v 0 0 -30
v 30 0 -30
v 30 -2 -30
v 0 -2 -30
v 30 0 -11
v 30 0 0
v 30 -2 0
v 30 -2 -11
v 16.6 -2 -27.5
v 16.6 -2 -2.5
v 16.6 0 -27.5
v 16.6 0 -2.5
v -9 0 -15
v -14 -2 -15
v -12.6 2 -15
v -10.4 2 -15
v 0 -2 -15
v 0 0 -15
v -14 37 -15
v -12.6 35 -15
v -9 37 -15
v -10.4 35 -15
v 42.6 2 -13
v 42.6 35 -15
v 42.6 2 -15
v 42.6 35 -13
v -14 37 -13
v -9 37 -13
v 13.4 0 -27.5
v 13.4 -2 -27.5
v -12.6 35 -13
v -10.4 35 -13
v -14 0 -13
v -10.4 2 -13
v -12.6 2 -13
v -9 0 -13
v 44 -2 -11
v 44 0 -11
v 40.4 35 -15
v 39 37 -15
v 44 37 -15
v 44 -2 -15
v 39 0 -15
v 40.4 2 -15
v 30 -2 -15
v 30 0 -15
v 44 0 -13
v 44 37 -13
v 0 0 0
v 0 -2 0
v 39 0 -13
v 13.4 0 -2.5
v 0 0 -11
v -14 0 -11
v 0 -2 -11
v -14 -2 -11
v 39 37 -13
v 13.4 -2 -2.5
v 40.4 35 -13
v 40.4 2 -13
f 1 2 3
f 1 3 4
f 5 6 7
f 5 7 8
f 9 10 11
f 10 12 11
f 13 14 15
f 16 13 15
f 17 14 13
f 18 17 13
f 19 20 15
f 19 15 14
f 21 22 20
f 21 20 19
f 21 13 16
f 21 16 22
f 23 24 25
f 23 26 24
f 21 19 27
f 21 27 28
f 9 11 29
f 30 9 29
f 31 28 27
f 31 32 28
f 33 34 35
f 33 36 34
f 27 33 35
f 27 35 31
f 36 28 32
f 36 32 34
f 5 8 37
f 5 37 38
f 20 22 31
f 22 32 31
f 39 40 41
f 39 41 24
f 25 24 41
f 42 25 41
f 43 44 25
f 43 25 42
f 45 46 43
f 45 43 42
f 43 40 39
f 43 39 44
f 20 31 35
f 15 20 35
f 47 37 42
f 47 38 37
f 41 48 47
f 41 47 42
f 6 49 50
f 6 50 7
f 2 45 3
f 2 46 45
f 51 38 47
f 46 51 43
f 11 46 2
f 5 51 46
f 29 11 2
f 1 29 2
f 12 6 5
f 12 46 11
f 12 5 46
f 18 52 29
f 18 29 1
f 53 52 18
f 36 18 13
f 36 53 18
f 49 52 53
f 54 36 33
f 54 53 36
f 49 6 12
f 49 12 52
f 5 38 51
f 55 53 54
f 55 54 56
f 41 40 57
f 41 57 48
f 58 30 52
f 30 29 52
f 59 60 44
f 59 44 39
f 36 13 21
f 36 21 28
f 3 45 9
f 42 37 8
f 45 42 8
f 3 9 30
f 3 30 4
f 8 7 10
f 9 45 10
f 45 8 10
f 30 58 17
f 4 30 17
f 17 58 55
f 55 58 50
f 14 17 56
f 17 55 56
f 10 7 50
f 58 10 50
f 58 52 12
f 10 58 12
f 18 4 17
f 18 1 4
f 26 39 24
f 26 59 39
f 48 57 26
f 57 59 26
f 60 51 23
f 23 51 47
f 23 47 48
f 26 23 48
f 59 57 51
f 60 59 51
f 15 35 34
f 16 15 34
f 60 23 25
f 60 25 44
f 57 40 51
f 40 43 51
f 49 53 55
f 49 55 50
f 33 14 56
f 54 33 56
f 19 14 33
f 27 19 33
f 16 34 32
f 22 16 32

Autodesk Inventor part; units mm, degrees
ref_plane "YZ Plane" through (0, 0, 0) normal (1, 0, 0) x (0, 1, 0)
ref_plane "XZ Plane" through (0, 0, 0) normal (0, 1, 0) x (-1, 0, 0)
ref_plane "XY Plane" through (0, 0, 0) normal (0, 0, 1) x (1, 0, 0)
sketch "Sketch2" plane through (0, 0, 0) normal (0, 1, 0) x (-1, 0, 0)
  line L0 (0, 0) -> (-30, 0)
  line L1 (-30, 0) -> (-30, -30)
  line L2 (-30, -30) -> (0, -30)
  line L3 (0, -30) -> (0, 0)
  line L4 (0, 0) -> (-30, 0)
  line L5 (-30, 0) -> (-30, -2)
  line L6 (0, -2) -> (0, 0)
  line L7 (0, -30) -> (-30, -30)
  line L8 (-30, -30) -> (-30, -44)
  line L9 (0, -44) -> (0, -30)
  point P0 (0, 0)
  dimension "d0" = 30
  dimension "d1" = 30
extrude "Extrusion2" add sketch "Sketch2" against normal blind 2
sketch "Sketch5" plane through (0, 0, 0) normal (0, 1, 0) x (1, 0, 0)
  line L0 (13.4, 2.5) -> (16.6, 2.5)
  line L1 (16.6, 2.5) -> (16.6, 27.5)
  line L2 (16.6, 27.5) -> (13.4, 27.5)
  line L3 (13.4, 27.5) -> (13.4, 2.5)
  line L4 (30, 30) -> (0, 30) projected
  line L5 (0, 30) -> (0, 0) projected
  line L6 (30, 0) -> (30, 30) projected
  point P0 (15, 2.5)
  point P1 (15, 27.5)
  dimension "d21" = 25
  dimension "d25" = 3.2
  dimension "d26" = 2.5
  dimension "d56" = 15
extrude "Extrusion5" cut sketch "Sketch5" against normal through all
sketch "Sketch6" plane through (0, 0, -30) normal (-1, 0, 0) x (0, 0, 1)
  line L0 (30, 0) -> (0, 0) projected
  line L1 (0, -2) -> (30, -2) projected
  line L2 (15, 0) -> (19, 0)
  line L3 (19, 0) -> (19, -2)
  line L4 (19, -2) -> (15, -2)
  line L5 (15, -2) -> (15, 0)
  line L6 (0, 0) -> (0, -2) projected
  point P0 (0, -1)
  point P1 (15, -1)
  point P2 (15, 0)
  dimension "d28" = 15
  dimension "d29" = 4
  dimension "d30" = 2
extrude "Extrusion6" add sketch "Sketch6" along normal blind 14 contours L3 L1 L5 L0
sketch "Sketch7" plane through (30, 0, 0) normal (1, 0, 0) x (0, 0, -1)
  line L0 (0, 0) -> (30, 0) projected
  line L1 (30, -2) -> (0, -2) projected
  line L2 (11, 0) -> (15, 0)
  line L3 (15, 0) -> (15, -2)
  line L4 (15, -2) -> (11, -2)
  line L5 (11, -2) -> (11, 0)
  line L6 (30, 0) -> (30, -2) projected
  point P0 (30, -1)
  point P1 (15, -1)
  point P2 (15, -2)
  dimension "d33" = 15
  dimension "d34" = 4
extrude "Extrusion7" add sketch "Sketch7" along normal blind 14 contours L0 L3 L1 L5
sketch "Sketch8" plane through (0, 0, 0) normal (0, 1, 0) x (1, 0, 0)
  line L0 (-14, 15) -> (-14, 11) projected
  line L1 (-14, 15) -> (-9, 15)
  line L2 (-9, 15) -> (-9, 13)
  line L3 (-9, 13) -> (-14, 13)
  line L4 (-14, 13) -> (-14, 15)
  line L5 (30, 15) -> (44, 15) projected
  line L6 (44, 15) -> (39, 15)
  line L7 (39, 15) -> (39, 13)
  line L8 (39, 13) -> (44, 13)
  line L9 (44, 13) -> (44, 15)
  point P0 (0, 0)
  point P1 (39, 15)
  point P2 (-14, 13)
  dimension "d37" = 5
  dimension "d38" = 2
  dimension "d39" = 5
  dimension "d40" = 2
extrude "Extrusion8" add sketch "Sketch8" along normal blind 37
sketch "Sketch9" plane through (-14, 0, -13) normal (0, 0, 1) x (1, 0, 0)
  line L0 (3.6, 35) -> (1.4, 35)
  line L1 (1.4, 35) -> (1.4, 2)
  line L2 (1.4, 2) -> (3.6, 2)
  line L3 (3.6, 2) -> (3.6, 35)
  line L4 (0, 37) -> (5, 37) projected
  line L5 (14, 0) -> (0, 0) projected
  line L6 (5, 0) -> (5, 37) projected
  line L7 (0, 0) -> (0, 37) projected
  line L8 (58, 0) -> (58, 37) projected
  line L9 (53, 0) -> (53, 37) projected
  line L10 (54.4, 35) -> (56.6, 35)
  line L11 (56.6, 35) -> (56.6, 2)
  line L12 (56.6, 2) -> (54.4, 2)
  line L13 (54.4, 2) -> (54.4, 35)
  line L14 (53, 37) -> (58, 37) projected
  line L15 (44, 0) -> (58, 0) projected
  point P0 (2.5, 37)
  point P1 (2.5, 35)
  point P2 (2.5, 2)
  point P3 (5, 18.5)
  point P4 (3.6, 18.5)
  point P5 (0, 18.5)
  point P6 (1.4, 18.5)
  point P7 (55.5, 37)
  point P8 (55.5, 35)
  point P9 (55.5, 2)
  dimension "d43" = 2
  dimension "d44" = 2
  dimension "d45" = 1.4
  dimension "d46" = 1.4
  dimension "d47" = 2.2
  dimension "d50" = 1.4
  dimension "d51" = 1.4
  dimension "d52" = 2
  dimension "d53" = 2
extrude "Extrusion9" cut sketch "Sketch9" against normal through all contours L3 L2 L1 L0 | L10 L11 L12 L13
properties part number "bobbin_support"
